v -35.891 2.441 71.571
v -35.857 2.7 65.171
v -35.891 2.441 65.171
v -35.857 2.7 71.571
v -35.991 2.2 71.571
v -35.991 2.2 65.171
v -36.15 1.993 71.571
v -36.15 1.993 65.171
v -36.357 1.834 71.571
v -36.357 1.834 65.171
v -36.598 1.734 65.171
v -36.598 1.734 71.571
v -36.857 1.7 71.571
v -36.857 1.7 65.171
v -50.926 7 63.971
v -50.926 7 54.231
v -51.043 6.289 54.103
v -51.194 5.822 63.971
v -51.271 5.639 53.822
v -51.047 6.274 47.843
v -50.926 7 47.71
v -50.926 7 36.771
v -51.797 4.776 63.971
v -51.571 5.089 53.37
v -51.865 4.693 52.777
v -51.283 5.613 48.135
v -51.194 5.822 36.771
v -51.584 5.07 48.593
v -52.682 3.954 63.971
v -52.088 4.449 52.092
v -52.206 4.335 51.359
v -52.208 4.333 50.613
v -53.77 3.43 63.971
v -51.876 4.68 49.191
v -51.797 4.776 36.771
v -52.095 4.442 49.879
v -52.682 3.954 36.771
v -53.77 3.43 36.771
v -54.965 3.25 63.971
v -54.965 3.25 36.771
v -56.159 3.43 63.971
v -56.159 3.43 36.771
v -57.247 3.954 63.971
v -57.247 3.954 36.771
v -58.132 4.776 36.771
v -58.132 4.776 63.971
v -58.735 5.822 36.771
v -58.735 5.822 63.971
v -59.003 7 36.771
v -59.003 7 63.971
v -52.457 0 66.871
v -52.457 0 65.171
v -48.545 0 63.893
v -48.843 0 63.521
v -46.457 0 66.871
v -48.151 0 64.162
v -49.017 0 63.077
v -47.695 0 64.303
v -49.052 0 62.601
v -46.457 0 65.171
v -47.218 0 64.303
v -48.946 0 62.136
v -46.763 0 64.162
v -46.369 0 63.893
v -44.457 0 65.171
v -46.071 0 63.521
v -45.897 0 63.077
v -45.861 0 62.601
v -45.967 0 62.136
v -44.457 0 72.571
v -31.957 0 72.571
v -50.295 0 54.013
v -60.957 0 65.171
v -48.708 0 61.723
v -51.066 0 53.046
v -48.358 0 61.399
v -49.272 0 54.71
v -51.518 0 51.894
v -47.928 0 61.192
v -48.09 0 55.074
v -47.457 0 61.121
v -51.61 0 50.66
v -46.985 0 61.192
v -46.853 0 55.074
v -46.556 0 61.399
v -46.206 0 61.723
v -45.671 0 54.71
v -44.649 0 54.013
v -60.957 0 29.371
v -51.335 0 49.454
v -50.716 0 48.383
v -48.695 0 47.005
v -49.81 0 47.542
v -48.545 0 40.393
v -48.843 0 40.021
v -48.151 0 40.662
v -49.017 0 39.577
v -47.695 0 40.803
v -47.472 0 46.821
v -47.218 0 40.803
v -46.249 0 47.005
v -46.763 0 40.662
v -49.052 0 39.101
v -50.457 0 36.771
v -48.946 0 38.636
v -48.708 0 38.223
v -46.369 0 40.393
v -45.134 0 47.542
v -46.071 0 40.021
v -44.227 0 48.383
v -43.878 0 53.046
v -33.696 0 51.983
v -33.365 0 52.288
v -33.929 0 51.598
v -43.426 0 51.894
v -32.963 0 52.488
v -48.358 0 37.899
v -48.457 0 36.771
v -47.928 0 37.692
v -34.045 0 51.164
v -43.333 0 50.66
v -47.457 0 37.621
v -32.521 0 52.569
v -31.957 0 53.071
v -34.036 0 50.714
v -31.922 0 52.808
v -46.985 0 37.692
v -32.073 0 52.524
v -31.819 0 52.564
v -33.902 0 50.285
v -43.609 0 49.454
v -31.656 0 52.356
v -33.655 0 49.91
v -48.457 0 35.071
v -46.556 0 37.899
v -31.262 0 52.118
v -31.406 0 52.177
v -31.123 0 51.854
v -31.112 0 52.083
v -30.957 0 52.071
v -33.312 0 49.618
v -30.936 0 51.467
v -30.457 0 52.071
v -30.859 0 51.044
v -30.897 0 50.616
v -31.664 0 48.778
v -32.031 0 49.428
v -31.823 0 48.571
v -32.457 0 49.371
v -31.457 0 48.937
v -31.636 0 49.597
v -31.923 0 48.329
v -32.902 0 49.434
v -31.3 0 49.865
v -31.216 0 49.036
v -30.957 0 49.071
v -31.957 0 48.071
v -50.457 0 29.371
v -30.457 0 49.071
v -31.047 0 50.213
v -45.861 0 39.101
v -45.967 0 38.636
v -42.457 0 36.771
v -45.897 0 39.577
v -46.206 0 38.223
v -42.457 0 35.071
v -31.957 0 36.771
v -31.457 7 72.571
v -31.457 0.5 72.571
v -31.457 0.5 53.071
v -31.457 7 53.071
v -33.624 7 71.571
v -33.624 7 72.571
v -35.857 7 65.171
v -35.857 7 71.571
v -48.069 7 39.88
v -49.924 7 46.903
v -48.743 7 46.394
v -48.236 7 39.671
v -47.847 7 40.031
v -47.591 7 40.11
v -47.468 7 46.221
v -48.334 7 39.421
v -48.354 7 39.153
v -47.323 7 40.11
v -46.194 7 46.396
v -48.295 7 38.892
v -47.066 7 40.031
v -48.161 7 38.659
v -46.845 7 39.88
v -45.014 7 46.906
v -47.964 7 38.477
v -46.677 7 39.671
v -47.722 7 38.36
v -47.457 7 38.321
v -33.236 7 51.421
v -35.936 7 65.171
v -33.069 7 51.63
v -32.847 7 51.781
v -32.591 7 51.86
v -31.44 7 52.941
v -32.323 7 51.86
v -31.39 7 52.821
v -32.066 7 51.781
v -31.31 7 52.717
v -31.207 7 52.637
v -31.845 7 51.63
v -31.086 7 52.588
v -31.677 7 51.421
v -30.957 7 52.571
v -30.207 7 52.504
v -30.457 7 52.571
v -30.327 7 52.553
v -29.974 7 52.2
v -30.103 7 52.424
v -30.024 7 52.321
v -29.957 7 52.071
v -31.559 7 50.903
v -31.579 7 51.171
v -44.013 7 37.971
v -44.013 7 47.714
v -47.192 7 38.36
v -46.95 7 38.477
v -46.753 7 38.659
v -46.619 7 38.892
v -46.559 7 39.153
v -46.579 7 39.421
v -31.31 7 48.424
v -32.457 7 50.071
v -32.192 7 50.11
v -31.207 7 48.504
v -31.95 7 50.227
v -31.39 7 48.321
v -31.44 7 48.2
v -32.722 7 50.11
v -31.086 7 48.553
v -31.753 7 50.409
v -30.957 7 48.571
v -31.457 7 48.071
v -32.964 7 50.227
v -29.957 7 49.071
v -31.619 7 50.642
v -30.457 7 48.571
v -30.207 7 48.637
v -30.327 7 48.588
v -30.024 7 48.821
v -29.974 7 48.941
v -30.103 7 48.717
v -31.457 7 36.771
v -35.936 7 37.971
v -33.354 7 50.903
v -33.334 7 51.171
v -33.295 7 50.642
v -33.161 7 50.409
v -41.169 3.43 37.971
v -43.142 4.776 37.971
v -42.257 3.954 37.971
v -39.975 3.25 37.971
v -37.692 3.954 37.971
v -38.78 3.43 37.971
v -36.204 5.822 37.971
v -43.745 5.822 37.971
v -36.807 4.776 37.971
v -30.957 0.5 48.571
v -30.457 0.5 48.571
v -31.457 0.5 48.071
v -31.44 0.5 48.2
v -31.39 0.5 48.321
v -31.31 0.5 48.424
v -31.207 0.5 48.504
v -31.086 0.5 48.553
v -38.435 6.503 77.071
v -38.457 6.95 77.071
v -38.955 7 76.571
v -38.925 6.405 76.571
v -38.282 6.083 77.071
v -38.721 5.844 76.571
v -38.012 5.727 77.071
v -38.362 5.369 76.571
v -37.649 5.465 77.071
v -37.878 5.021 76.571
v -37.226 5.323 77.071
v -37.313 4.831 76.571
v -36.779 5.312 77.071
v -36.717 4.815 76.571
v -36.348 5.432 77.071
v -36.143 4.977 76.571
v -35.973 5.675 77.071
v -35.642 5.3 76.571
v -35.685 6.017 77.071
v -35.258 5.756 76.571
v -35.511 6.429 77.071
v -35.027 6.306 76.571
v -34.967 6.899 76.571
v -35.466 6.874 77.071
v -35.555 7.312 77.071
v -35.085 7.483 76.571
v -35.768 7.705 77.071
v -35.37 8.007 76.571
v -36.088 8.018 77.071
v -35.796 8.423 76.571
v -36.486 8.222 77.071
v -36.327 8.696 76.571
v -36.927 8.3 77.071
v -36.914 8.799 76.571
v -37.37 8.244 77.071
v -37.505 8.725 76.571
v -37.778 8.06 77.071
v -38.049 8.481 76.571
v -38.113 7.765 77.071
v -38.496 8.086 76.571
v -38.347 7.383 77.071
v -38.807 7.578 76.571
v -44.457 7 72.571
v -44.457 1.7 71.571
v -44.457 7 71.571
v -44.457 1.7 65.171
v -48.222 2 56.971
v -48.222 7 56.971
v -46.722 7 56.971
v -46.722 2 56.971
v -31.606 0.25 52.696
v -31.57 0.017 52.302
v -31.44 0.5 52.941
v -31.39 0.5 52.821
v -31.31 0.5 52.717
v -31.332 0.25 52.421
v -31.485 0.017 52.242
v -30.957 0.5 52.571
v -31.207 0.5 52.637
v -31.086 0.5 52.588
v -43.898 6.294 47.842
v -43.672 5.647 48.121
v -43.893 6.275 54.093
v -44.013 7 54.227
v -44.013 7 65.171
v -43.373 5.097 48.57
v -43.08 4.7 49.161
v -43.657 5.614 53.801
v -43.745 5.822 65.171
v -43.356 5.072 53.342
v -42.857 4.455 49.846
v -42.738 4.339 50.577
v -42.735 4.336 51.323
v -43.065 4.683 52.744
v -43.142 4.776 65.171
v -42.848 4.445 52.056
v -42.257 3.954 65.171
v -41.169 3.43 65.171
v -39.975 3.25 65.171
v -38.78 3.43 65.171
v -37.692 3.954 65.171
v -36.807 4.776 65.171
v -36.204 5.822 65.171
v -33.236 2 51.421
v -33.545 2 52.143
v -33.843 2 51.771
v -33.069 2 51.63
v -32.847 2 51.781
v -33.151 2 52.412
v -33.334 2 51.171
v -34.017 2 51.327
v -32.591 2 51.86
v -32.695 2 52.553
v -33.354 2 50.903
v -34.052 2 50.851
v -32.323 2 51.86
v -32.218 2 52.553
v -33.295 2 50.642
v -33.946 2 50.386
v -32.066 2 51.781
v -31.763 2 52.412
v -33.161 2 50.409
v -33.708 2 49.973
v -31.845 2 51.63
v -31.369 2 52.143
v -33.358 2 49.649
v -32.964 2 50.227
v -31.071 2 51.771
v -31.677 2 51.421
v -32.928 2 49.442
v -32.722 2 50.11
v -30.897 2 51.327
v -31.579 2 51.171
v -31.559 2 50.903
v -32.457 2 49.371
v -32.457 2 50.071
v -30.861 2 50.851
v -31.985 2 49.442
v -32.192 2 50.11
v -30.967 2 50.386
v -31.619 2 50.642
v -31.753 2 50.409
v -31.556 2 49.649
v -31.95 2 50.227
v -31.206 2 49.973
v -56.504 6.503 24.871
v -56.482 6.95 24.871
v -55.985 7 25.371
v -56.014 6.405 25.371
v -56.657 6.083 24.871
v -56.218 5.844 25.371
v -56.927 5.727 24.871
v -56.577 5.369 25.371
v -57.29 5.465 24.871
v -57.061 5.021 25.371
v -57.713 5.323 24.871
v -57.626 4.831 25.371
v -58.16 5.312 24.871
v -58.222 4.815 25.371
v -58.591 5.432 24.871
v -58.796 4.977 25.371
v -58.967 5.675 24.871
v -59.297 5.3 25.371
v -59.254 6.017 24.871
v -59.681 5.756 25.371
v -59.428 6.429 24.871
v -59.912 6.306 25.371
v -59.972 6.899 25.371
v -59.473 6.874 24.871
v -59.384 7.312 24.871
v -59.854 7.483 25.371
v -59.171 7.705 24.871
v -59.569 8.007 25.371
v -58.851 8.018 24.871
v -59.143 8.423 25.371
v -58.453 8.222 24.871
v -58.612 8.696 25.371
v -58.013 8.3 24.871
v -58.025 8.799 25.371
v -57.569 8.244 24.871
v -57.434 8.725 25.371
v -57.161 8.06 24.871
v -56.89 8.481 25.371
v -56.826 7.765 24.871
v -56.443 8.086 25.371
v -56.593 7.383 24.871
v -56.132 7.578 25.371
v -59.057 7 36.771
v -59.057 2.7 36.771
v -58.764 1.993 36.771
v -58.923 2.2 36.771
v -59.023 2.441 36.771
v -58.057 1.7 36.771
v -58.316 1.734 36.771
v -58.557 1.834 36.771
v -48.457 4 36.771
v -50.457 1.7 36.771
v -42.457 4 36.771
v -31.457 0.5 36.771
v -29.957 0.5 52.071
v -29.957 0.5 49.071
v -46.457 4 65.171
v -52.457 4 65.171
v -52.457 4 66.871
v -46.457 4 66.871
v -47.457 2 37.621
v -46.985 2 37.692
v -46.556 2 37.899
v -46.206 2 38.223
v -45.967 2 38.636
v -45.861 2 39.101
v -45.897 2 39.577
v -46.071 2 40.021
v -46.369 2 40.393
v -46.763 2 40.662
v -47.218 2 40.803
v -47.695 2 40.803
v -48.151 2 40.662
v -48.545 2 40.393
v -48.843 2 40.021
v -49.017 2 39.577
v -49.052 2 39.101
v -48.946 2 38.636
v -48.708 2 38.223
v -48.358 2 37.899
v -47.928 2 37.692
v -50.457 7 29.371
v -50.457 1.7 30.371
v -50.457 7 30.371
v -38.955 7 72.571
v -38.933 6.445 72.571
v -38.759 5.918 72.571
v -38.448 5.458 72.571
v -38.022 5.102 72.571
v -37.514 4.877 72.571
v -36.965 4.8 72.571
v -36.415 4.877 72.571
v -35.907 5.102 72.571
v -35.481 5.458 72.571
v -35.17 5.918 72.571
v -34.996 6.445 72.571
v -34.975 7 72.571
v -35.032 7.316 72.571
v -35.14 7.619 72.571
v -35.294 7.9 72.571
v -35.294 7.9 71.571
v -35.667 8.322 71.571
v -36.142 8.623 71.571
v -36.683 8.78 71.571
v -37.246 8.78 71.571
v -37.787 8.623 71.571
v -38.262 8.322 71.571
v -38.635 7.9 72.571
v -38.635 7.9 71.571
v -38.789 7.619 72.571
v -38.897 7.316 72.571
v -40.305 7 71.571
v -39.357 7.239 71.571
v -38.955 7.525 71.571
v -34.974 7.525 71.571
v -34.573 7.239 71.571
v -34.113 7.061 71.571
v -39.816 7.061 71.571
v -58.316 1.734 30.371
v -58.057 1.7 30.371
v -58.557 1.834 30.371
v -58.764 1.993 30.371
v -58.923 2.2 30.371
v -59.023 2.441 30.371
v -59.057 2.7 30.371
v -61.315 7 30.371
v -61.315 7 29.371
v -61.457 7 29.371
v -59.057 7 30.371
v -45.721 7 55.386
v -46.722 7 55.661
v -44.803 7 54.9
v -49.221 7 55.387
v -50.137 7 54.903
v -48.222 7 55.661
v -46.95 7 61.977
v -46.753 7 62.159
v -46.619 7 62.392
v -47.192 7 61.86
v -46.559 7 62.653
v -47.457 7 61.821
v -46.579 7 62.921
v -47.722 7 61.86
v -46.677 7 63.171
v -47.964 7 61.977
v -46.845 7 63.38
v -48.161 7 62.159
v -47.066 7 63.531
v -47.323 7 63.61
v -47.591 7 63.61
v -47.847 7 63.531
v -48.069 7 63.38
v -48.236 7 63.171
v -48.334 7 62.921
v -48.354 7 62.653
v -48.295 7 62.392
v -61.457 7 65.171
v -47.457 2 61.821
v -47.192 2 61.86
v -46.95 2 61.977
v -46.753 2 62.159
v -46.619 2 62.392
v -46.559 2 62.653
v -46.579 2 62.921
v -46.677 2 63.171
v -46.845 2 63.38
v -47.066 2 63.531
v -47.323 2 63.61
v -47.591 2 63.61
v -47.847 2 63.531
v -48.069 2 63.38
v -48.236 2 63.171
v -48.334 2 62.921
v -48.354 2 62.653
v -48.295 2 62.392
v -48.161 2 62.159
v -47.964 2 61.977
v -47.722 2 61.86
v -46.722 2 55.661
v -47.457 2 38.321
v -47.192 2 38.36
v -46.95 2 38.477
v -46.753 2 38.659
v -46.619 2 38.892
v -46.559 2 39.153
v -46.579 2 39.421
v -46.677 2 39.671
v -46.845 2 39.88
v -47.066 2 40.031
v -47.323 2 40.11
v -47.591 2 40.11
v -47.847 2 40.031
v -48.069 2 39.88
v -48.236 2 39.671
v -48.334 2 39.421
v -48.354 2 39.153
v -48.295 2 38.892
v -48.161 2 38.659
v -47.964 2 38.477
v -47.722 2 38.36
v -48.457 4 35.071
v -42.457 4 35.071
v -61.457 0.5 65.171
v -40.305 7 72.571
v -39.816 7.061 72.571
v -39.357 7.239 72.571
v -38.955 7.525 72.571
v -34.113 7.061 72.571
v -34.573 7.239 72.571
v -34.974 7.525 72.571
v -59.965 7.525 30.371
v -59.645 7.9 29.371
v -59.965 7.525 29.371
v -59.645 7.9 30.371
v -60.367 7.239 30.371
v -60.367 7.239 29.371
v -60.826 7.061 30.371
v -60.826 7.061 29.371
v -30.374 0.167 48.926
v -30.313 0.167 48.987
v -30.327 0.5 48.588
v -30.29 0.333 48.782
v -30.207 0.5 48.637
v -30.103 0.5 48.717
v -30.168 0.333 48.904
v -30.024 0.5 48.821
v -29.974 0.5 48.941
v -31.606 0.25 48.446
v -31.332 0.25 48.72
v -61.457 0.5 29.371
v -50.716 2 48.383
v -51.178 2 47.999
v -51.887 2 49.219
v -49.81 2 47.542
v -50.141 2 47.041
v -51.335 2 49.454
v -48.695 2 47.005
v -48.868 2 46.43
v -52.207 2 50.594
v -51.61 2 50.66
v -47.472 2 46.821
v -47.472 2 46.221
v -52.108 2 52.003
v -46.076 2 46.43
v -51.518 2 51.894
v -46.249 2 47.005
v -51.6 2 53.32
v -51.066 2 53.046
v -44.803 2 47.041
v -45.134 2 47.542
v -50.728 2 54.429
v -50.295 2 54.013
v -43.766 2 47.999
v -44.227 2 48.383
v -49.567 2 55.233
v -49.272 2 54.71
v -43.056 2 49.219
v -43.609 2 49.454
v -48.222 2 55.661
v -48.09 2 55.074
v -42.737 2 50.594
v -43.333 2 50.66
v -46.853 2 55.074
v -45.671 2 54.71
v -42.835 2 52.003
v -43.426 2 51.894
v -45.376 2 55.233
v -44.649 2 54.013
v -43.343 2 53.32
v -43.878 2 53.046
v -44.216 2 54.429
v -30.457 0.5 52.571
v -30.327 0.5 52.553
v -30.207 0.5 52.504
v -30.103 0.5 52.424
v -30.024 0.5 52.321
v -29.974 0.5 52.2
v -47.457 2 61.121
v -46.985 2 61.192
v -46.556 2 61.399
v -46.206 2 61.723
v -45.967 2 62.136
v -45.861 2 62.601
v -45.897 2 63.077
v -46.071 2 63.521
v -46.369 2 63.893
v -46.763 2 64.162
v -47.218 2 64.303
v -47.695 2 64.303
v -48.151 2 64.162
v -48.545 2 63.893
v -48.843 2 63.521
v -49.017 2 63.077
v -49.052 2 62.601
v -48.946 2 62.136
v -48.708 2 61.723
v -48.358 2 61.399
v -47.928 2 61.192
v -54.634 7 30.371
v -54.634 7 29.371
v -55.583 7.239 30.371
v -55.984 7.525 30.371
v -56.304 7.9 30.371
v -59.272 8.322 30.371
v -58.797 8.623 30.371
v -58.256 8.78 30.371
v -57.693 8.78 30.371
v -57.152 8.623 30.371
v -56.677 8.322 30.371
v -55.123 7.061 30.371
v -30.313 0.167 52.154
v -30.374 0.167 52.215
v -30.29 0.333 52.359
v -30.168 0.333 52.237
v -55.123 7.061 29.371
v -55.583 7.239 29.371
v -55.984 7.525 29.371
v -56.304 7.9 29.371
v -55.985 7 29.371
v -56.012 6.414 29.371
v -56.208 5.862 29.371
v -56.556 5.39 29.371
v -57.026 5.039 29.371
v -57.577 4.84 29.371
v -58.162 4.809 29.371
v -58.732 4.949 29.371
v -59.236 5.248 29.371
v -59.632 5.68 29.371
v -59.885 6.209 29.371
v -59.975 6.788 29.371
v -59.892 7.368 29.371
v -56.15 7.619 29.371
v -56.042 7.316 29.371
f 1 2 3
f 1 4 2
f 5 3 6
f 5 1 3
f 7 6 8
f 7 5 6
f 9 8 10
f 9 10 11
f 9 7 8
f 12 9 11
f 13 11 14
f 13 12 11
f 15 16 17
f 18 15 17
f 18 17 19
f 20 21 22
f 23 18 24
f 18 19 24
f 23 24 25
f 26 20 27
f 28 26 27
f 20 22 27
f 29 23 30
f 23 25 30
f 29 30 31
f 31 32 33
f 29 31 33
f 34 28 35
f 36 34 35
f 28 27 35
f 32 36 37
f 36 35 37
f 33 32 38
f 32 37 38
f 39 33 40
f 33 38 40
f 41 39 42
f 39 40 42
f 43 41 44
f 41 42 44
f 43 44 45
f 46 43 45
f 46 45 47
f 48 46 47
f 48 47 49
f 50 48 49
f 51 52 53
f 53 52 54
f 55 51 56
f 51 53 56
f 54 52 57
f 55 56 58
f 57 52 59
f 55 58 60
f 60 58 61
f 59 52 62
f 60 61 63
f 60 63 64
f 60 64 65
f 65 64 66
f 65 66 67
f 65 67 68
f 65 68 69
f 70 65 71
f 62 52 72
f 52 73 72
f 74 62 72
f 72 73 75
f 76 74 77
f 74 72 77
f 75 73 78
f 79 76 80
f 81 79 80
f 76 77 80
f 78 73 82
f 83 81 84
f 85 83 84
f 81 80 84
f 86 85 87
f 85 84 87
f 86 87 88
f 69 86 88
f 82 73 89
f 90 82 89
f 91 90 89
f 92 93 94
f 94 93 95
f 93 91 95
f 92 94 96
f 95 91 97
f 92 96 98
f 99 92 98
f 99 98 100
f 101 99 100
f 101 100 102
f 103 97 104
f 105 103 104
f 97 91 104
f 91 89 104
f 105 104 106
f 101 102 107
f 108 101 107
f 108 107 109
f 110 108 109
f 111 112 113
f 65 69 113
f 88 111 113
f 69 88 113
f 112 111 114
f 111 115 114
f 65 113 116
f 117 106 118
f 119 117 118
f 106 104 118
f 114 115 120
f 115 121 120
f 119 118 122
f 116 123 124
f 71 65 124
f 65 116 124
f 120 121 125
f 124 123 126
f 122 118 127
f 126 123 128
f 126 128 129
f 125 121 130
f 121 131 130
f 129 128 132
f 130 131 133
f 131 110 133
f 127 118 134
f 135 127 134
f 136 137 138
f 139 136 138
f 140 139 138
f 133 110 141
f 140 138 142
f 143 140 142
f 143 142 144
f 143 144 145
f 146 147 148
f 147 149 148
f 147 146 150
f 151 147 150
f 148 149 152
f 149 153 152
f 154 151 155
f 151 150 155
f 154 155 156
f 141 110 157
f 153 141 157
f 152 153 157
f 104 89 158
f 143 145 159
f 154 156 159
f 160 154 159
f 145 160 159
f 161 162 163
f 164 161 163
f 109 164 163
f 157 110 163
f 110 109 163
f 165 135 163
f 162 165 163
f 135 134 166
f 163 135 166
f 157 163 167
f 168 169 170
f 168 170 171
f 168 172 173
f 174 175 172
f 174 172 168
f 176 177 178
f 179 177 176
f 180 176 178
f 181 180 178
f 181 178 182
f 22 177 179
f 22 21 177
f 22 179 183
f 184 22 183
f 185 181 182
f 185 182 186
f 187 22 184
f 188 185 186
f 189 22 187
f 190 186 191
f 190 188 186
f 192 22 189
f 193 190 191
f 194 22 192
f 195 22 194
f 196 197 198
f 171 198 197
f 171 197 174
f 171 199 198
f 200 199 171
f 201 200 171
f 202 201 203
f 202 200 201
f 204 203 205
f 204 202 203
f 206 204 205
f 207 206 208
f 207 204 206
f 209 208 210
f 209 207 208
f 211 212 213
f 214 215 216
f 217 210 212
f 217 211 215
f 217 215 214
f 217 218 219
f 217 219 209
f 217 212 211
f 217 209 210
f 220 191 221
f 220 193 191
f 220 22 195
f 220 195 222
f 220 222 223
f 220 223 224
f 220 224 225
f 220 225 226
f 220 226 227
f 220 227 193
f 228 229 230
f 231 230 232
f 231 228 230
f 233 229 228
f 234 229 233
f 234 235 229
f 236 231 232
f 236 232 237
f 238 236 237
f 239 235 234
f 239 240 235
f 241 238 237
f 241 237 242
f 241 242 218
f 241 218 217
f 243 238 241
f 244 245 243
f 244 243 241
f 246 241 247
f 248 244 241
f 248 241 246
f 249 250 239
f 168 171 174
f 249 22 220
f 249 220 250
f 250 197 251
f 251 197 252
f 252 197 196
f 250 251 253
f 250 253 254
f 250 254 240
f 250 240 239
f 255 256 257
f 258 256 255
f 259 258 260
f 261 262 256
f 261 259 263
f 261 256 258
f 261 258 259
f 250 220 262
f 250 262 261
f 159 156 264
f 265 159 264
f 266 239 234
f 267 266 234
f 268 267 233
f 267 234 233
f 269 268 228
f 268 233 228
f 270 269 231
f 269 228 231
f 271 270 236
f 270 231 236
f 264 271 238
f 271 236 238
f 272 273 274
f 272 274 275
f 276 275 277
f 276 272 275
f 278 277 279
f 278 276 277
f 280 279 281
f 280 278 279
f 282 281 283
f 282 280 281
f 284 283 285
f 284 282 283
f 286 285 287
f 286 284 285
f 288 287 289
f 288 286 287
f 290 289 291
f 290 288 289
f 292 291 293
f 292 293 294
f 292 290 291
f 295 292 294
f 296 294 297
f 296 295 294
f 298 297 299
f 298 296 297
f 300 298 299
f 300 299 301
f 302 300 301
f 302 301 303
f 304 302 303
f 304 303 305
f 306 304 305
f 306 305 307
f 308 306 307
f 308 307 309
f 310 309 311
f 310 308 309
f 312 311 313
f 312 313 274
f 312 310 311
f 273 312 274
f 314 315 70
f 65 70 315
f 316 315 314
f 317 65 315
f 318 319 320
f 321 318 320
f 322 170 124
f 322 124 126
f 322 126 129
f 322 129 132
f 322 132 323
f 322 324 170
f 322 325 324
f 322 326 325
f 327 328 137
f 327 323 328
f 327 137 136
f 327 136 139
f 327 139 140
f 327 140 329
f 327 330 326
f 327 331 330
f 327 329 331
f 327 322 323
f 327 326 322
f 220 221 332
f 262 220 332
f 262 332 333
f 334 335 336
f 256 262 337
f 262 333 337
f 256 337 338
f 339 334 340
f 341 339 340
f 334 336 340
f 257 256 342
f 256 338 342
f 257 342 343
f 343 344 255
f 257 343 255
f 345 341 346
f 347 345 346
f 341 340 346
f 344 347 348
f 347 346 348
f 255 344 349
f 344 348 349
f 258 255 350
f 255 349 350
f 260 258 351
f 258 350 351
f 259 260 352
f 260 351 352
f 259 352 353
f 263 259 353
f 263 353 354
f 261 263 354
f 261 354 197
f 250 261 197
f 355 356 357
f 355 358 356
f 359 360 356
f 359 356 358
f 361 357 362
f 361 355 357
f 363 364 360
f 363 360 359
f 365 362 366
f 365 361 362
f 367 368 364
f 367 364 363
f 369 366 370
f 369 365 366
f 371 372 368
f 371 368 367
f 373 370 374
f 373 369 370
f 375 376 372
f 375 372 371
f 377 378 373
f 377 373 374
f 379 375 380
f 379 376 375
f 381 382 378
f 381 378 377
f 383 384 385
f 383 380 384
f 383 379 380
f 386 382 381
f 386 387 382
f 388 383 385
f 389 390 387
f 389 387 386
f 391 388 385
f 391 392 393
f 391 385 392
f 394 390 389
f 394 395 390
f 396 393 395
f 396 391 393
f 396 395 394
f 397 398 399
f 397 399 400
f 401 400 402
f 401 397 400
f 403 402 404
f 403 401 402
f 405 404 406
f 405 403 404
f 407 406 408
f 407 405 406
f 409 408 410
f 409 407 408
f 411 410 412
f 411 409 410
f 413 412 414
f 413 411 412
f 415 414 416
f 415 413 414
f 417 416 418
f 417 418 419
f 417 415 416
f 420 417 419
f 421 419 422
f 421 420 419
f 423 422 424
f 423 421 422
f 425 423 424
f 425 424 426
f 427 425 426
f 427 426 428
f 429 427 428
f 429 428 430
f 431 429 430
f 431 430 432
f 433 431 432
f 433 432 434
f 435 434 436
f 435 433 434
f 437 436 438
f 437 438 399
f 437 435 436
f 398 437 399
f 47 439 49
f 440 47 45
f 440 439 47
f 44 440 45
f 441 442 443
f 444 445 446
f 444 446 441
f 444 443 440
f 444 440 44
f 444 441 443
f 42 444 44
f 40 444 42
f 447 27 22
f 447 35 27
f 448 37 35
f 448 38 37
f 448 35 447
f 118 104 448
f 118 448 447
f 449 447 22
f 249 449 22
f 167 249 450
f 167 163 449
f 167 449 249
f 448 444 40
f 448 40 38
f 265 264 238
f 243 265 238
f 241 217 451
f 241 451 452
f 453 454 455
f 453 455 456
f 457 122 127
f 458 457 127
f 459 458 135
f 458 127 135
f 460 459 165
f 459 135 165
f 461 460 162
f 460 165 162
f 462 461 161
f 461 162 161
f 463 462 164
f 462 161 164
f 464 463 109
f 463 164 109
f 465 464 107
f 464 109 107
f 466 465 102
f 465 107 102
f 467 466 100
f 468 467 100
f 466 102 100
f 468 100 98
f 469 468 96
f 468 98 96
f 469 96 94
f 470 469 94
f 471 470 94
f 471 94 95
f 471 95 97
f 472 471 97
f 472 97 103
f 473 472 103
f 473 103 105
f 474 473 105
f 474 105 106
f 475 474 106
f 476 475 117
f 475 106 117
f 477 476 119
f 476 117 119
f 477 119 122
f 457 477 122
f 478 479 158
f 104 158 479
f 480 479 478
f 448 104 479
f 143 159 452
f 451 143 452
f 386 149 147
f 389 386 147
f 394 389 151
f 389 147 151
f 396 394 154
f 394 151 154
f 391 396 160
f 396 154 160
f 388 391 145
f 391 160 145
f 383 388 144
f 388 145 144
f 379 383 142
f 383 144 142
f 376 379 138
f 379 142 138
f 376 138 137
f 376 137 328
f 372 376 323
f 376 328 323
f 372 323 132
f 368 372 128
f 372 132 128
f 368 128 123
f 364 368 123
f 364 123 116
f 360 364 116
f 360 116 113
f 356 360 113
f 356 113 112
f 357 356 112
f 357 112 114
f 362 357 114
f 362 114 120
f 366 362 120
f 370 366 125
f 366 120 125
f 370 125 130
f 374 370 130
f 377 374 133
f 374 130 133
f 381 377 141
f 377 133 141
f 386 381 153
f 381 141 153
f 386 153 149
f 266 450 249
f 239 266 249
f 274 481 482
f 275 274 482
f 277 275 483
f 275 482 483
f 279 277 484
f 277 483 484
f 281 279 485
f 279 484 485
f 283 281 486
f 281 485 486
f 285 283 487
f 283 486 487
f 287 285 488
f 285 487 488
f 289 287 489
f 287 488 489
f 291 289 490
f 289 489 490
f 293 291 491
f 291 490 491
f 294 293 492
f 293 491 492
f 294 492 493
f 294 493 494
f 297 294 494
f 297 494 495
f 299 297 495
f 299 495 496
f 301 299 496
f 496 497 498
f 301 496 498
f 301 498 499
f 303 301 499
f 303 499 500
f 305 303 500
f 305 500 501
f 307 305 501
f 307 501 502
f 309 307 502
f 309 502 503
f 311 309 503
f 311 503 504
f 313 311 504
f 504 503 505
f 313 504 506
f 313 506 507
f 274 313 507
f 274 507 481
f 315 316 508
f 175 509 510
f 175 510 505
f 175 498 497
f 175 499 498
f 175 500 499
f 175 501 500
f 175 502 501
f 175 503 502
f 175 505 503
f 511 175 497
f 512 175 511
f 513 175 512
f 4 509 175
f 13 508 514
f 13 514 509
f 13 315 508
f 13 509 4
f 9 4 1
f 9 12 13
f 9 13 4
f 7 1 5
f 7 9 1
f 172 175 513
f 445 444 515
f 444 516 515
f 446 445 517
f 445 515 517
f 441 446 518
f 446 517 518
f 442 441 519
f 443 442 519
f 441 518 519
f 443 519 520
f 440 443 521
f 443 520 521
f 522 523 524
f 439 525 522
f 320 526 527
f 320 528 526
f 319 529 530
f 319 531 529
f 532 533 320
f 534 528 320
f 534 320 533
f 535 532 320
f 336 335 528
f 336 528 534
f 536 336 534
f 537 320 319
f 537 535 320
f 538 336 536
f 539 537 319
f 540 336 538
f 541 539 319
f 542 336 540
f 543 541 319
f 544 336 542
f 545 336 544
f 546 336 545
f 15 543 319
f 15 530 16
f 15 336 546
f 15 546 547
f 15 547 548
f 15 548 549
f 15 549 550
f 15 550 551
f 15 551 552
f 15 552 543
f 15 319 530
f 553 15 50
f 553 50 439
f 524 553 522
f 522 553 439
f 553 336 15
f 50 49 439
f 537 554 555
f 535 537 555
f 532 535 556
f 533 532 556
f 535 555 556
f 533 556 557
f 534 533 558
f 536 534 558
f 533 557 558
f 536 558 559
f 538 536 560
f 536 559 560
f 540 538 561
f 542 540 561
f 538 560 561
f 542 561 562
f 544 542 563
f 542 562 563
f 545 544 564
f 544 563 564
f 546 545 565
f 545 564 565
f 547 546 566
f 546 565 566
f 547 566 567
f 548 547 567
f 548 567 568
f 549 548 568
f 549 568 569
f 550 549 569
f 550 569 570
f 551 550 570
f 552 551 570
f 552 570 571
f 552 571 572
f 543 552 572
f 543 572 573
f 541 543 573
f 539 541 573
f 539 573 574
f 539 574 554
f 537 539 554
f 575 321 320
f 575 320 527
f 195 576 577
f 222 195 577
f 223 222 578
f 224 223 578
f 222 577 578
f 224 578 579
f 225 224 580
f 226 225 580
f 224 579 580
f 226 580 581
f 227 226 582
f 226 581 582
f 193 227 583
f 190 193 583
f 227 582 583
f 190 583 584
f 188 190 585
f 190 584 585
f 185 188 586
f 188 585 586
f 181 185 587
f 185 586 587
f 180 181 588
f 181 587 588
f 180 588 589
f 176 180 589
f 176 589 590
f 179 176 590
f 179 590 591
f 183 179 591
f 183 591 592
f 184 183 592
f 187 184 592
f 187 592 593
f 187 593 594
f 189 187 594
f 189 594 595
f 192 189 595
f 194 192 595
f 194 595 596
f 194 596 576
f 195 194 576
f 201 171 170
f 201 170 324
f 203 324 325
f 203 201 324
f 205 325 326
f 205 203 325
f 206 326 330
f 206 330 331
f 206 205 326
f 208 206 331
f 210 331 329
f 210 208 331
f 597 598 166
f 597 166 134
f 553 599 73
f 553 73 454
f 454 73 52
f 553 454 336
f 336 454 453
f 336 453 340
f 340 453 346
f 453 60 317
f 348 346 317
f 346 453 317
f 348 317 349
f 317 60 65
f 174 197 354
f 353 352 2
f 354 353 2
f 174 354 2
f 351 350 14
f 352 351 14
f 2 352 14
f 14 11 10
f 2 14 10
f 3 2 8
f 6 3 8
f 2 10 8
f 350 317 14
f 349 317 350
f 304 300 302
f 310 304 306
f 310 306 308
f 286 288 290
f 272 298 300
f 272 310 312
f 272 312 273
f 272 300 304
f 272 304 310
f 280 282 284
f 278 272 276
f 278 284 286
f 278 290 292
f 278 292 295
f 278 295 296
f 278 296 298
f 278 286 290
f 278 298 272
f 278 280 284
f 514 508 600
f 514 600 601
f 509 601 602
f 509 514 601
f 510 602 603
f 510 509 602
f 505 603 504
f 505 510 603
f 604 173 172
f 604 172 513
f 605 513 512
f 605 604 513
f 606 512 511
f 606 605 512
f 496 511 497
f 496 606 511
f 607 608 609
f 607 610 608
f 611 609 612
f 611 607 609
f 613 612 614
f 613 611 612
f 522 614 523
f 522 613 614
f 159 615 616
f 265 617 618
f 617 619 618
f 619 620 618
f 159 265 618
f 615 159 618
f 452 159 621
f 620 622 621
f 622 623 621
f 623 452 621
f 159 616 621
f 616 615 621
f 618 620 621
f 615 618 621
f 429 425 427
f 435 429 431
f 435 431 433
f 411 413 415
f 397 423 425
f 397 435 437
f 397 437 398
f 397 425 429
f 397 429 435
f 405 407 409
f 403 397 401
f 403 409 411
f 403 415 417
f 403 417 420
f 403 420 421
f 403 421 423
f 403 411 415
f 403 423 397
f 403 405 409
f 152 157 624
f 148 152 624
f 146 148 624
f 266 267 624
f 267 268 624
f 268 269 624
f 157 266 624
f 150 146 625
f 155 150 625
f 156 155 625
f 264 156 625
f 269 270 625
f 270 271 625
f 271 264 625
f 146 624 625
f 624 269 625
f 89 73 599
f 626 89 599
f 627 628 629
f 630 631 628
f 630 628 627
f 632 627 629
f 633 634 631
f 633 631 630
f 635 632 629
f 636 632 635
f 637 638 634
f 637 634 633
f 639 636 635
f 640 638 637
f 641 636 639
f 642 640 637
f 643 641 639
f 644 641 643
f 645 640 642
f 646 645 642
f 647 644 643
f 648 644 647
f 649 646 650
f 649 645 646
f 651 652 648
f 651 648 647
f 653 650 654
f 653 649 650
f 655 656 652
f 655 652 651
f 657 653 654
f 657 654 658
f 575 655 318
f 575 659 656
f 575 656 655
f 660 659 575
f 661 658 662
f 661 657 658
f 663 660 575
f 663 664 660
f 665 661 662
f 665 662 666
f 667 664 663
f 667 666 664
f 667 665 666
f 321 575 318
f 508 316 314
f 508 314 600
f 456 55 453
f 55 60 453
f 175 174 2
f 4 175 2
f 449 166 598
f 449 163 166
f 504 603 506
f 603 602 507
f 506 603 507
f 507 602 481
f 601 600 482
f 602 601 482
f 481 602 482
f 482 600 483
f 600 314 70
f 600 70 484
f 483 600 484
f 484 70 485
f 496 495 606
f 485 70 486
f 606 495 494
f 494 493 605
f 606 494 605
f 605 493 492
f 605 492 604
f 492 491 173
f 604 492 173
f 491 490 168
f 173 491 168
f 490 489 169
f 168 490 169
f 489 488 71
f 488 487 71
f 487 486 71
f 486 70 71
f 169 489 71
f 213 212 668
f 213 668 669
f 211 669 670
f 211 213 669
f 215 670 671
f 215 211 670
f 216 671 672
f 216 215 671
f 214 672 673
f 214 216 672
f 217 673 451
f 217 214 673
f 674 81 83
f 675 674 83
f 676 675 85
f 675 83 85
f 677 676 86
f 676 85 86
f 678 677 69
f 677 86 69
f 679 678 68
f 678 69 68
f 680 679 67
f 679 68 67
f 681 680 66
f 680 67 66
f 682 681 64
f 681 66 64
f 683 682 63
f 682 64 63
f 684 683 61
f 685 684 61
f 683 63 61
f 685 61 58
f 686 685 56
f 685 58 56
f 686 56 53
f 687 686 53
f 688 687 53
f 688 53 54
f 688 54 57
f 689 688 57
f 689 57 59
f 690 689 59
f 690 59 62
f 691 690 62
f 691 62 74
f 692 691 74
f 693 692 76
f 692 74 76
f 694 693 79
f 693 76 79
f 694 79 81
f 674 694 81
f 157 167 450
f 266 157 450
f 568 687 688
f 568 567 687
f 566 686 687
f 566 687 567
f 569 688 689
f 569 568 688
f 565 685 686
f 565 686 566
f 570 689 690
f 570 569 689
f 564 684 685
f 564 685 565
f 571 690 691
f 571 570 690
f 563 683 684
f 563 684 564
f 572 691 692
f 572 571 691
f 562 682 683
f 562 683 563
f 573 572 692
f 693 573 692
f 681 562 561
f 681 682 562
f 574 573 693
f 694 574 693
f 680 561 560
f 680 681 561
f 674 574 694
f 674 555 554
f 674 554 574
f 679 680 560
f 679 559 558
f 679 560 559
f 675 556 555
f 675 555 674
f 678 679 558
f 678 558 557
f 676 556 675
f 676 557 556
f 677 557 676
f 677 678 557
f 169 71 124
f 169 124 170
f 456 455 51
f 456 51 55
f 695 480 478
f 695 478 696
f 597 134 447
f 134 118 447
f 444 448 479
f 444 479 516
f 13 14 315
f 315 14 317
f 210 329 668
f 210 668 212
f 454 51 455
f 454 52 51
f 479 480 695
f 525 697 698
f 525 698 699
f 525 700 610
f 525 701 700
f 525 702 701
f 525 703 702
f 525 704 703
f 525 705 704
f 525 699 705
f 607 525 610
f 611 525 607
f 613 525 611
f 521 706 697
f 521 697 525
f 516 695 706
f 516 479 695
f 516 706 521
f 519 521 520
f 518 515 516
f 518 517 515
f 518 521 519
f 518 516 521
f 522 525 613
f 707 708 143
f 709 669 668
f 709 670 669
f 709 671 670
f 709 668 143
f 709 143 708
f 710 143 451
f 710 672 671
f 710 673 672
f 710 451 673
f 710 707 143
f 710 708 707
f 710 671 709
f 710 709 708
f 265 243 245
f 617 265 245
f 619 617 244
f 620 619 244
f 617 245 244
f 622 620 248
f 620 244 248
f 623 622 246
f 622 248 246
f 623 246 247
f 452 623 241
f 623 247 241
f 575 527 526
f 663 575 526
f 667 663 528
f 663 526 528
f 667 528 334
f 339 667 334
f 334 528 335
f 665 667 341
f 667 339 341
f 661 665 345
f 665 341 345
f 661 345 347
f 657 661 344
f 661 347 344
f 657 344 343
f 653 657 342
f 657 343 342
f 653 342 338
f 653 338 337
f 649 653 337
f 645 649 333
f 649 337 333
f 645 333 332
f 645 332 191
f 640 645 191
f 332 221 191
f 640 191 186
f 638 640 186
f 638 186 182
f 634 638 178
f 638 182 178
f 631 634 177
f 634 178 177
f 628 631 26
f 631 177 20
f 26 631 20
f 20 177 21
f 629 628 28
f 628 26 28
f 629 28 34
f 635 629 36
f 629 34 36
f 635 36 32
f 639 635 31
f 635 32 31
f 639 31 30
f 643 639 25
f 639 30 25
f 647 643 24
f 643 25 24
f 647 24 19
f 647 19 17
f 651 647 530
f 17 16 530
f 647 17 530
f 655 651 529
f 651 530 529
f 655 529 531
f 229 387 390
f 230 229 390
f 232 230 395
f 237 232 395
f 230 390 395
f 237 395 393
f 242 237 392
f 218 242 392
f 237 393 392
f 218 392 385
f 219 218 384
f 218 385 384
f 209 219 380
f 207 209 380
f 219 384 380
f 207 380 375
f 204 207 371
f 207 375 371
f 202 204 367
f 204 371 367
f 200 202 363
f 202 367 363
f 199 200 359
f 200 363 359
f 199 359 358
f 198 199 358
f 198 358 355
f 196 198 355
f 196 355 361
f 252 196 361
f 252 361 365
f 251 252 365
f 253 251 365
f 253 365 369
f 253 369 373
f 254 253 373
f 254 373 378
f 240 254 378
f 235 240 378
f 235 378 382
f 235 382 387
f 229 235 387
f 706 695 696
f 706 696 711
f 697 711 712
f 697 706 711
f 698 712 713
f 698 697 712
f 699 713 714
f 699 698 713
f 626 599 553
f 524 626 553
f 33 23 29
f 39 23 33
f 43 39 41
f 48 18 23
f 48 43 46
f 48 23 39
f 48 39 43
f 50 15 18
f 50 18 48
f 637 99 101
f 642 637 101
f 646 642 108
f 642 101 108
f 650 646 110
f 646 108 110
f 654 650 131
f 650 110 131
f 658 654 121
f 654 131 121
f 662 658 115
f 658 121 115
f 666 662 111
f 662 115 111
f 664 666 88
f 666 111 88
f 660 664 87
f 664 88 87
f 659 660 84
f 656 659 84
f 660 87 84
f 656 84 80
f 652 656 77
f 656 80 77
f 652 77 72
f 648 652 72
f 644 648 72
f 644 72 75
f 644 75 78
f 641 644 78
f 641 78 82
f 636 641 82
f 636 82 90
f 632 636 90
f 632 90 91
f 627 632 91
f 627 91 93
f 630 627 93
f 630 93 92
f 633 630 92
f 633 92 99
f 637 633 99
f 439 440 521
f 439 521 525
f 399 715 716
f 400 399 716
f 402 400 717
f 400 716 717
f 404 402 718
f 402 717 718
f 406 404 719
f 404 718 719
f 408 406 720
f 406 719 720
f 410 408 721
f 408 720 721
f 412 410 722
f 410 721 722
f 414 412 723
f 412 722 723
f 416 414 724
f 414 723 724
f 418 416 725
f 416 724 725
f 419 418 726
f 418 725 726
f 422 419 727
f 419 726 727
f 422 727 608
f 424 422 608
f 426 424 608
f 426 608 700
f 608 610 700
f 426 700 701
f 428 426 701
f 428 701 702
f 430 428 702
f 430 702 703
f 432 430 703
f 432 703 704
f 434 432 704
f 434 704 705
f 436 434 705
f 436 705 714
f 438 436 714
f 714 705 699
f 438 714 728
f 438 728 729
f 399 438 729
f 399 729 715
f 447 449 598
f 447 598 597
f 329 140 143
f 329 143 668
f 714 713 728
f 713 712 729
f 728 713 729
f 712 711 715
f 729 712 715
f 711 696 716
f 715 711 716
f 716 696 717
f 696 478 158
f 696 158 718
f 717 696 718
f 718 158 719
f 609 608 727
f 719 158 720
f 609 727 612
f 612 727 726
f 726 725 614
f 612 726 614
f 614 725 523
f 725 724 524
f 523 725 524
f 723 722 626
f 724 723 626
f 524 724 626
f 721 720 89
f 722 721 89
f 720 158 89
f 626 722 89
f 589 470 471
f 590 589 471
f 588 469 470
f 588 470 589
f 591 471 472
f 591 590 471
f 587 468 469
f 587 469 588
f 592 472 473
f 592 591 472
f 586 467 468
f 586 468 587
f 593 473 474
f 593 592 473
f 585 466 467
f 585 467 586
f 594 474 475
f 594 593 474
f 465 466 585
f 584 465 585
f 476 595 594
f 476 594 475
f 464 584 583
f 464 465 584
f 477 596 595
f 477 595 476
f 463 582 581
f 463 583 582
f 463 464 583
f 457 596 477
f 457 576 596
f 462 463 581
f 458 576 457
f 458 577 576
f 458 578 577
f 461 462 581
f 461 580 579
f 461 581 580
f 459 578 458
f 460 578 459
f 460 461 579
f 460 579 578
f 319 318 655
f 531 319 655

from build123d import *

# Parameters (mm, degrees)
SKETCH1_W            = 30
SKETCH1_H            = 30.8
BOSS_EXTRUDE1_DEPTH  = 7
SKETCH2_R            = 4.15
CUT_EXTRUDE1_DEPTH   = 6.5
SKETCH3_W            = 15
SKETCH3_H            = 1.2
SKETCH3_W_2          = 9
SKETCH3_W_3          = 11
SKETCH3_W_4          = 13
CUT_EXTRUDE2_DEPTH   = 4
SKETCH4_W            = 30
SKETCH4_H            = 3
CUT_EXTRUDE3_DEPTH   = 1.2
SKETCH5_W            = 30
SKETCH5_H            = 3
CUT_EXTRUDE4_DEPTH   = 1.2
SKETCH6_R            = 4.05
CUT_EXTRUDE5_DEPTH   = 27.2
SKETCH7_R            = 4.05
CUT_EXTRUDE6_DEPTH   = 27.2
SKETCH8_R            = 4.75
CUT_EXTRUDE7_DEPTH   = 5
BOSS_EXTRUDE2_DEPTH  = 6.4
FILLET1_R            = 1
BOSS_EXTRUDE3_DEPTH  = 6.4
FILLET2_R            = 1
SKETCH12_W           = 1.5
SKETCH12_H           = 1.344099237
CUT_EXTRUDE8_DEPTH   = 5
SKETCH13_W           = 13
SKETCH13_H           = 7
BOSS_EXTRUDE4_DEPTH  = 1
SKETCH14_W           = 11
SKETCH14_H           = 7
BOSS_EXTRUDE5_DEPTH  = 1
SKETCH15_R           = 2
BOSS_EXTRUDE8_DEPTH  = 5.5
SKETCH16_R           = 2
BOSS_EXTRUDE9_DEPTH  = 5.5
FILLET3_R            = 2
FILLET4_R            = 2
FILLET5_R            = 2
CHAMFER2_SIZE        = 0.5
CHAMFER3_SIZE        = 0.5
SKETCH17_W           = 4
SKETCH17_H           = 7
BOSS_EXTRUDE10_DEPTH = 1.5
FILLET7_R            = 0.5
SKETCH18_R           = 0.9
CUT_EXTRUDE9_DEPTH   = 99.965895754
SKETCH19_R           = 1.6
CUT_EXTRUDE10_DEPTH  = 2
SKETCH20_R           = 0.9
CUT_EXTRUDE11_DEPTH  = 99.965895754
SKETCH21_R           = 1.6
CUT_EXTRUDE12_DEPTH  = 2
CHAMFER6_SIZE        = 0.5
SKETCH22_W           = 6
SKETCH22_H           = 4
BOSS_EXTRUDE11_DEPTH = 0.5
SKETCH23_W           = 6
SKETCH23_H           = 4
BOSS_EXTRUDE12_DEPTH = 0.5


with BuildPart() as part:
    # Sketch1 → Boss-Extrude1 (new body)
    with BuildSketch(Plane(origin=(0, 0, 0), x_dir=(1, 0, 0), z_dir=(0, 1, 0))):
        with Locations((-46.45686042, -50.970505576)):
            Rectangle(SKETCH1_W, SKETCH1_H)
    extrude(amount=BOSS_EXTRUDE1_DEPTH)

    # Sketch2 → Cut-Extrude1 (cut)
    with BuildSketch(Plane.XZ):
        with Locations(Location((-47.47186042, 50.970505576, 0), (0, 0, 270))):
            Circle(SKETCH2_R)
    extrude(amount=-CUT_EXTRUDE1_DEPTH, mode=Mode.SUBTRACT)

    # Sketch3 → Cut-Extrude2 (cut)
    with BuildSketch(Plane.XZ):
        with Locations((-38.95686042, 65.770505576)):
            Rectangle(SKETCH3_W, SKETCH3_H)
        with Locations((-56.95686042, 65.770505576)):
            Rectangle(SKETCH3_W_2, SKETCH3_H)
        with Locations((-36.95686042, 36.170505576)):
            Rectangle(SKETCH3_W_3, SKETCH3_H)
        with Locations((-54.95686042, 36.170505576)):
            Rectangle(SKETCH3_W_4, SKETCH3_H)
    extrude(amount=-CUT_EXTRUDE2_DEPTH, mode=Mode.SUBTRACT)

    # Sketch4 → Cut-Extrude3 (cut)
    with BuildSketch(Plane.XY.offset(66.370505576)):
        with Locations((-46.45686042, 5.5)):
            Rectangle(SKETCH4_W, SKETCH4_H)
    extrude(amount=-CUT_EXTRUDE3_DEPTH, mode=Mode.SUBTRACT)

    # Sketch5 → Cut-Extrude4 (cut)
    with BuildSketch(Plane(origin=(0, 0, 35.570505576), x_dir=(-1, 0, 0), z_dir=(0, 0, -1))):
        with Locations((46.45686042, 5.5)):
            Rectangle(SKETCH5_W, SKETCH5_H)
    extrude(amount=-CUT_EXTRUDE4_DEPTH, mode=Mode.SUBTRACT)

    # Sketch6 → Cut-Extrude5 (cut)
    with BuildSketch(Plane.XY.offset(65.170505576)):
        with Locations((-39.974556342, 7.3)):
            Circle(SKETCH6_R)
    extrude(amount=-CUT_EXTRUDE5_DEPTH, mode=Mode.SUBTRACT)

    # Sketch7 → Cut-Extrude6 (cut)
    with BuildSketch(Plane(origin=(0, 0, 36.770505576), x_dir=(-1, 0, 0), z_dir=(0, 0, -1))):
        with Locations((54.96455223, 7.3)):
            Circle(SKETCH7_R)
    extrude(amount=-CUT_EXTRUDE6_DEPTH, mode=Mode.SUBTRACT)

    # Sketch8 → Cut-Extrude7 (cut)
    with BuildSketch(Plane(origin=(0, 7, 0), x_dir=(1, 0, 0), z_dir=(0, 1, 0))):
        with Locations(Location((-47.47186042, -50.970505576, 0), (0, 0, 270))):
            Circle(SKETCH8_R)
    extrude(amount=-CUT_EXTRUDE7_DEPTH, mode=Mode.SUBTRACT)

    # Sketch10 → Boss-Extrude2 (add)
    with BuildSketch(Plane.XY.offset(65.170505576)):
        Polygon((-31.45686042, 0), (-31.45686042, 7), (-35.85686042, 7), (-35.85686042, 1.7), (-44.45686042, 1.7), (-44.45686042, 0), align=None)
    extrude(amount=BOSS_EXTRUDE2_DEPTH)

    # Fillet1
    fillet1_edges = [part.edges().sort_by_distance(p)[0] for p in [
        (-35.85686042, 1.7, 68.370505576),
    ]]
    fillet(fillet1_edges, radius=FILLET1_R)

    # Sketch11 → Boss-Extrude3 (add)
    with BuildSketch(Plane(origin=(0, 0, 36.770505576), x_dir=(-1, 0, 0), z_dir=(0, 0, -1))):
        Polygon((61.45686042, 7), (61.45686042, 0), (50.45686042, 0), (50.45686042, 1.7), (59.05686042, 1.7), (59.05686042, 7), align=None)
    extrude(amount=BOSS_EXTRUDE3_DEPTH)

    # Fillet2
    fillet2_edges = [part.edges().sort_by_distance(p)[0] for p in [
        (-59.05686042, 1.7, 33.570505576),
    ]]
    fillet(fillet2_edges, radius=FILLET2_R)

    # Sketch12 → Cut-Extrude8 (cut)
    with BuildSketch(Plane(origin=(0, 7, 0), x_dir=(1, 0, 0), z_dir=(0, 1, 0))):
        with Locations((-47.47186042, -56.298455958)):
            Rectangle(SKETCH12_W, SKETCH12_H)
    extrude(amount=-CUT_EXTRUDE8_DEPTH, mode=Mode.SUBTRACT)

    # Sketch13 → Boss-Extrude4 (add)
    with BuildSketch(Plane.XY.offset(71.570505576)):
        with Locations((-37.95686042, 3.5)):
            Rectangle(SKETCH13_W, SKETCH13_H)
    extrude(amount=BOSS_EXTRUDE4_DEPTH)

    # Sketch14 → Boss-Extrude5 (add)
    with BuildSketch(Plane(origin=(0, 0, 30.370505576), x_dir=(-1, 0, 0), z_dir=(0, 0, -1))):
        with Locations((55.95686042, 3.5)):
            Rectangle(SKETCH14_W, SKETCH14_H)
    extrude(amount=BOSS_EXTRUDE5_DEPTH)

    # Sketch15 → Boss-Extrude8 (add)
    with BuildSketch(Plane.XY.offset(71.570505576)):
        with Locations(Location((-36.96455223, 6.8, 0), (0, 0, 174.260829523))):
            Circle(SKETCH15_R)
    extrude(amount=BOSS_EXTRUDE8_DEPTH)

    # Sketch16 → Boss-Extrude9 (add)
    with BuildSketch(Plane(origin=(0, 0, 30.370505576), x_dir=(-1, 0, 0), z_dir=(0, 0, -1))):
        with Locations(Location((57.974556342, 6.8, 0), (0, 0, 174.260829523))):
            Circle(SKETCH16_R)
    extrude(amount=BOSS_EXTRUDE9_DEPTH)

    # Fillet3
    fillet3_edges = [part.edges().sort_by_distance(p)[0] for p in [
        (-59.964531217, 7, 29.870505576),
    ]]
    fillet(fillet3_edges, radius=FILLET3_R)

    # Fillet4
    # the kernel refuses this fillet: 2 mm, written as the material it adds along each edge
    with BuildSketch(Plane(origin=(-55.984581468, 7, 30.370505576), x_dir=(1.0, 6.770411692114482e-12, 0), z_dir=(0, 0, -1))) as fillet4_piece_1:
        with BuildLine():
            CenterArc((1.350683743, -2), FILLET4_R, 90, 56.632987031)
            ThreePointArc((-0.319645565, -0.9), (-0.105311329, -0.469360383), (0, 0))
            Line((0, 0), (1.350683743, 0))
        make_face()
    extrude(amount=1)

    # Fillet5
    # the kernel refuses this fillet: 2 mm, written as the material it adds along each edge
    with BuildSketch(Plane(origin=(-38.954527104, 7, 71.570505576), x_dir=(-1.0, 6.9854393361833605e-12, 0), z_dir=(0, 0, 1)), Plane(origin=(-34.974577356, 7, 72.570505576), x_dir=(1, 0, 0), z_dir=(0, 0, -1))) as fillet5_piece_1:
        with BuildLine():
            CenterArc((1.350683743, -2), FILLET5_R, 90, 56.632987031)
            ThreePointArc((-0.319645565, -0.9), (-0.105311329, -0.469360383), (0, 0))
            Line((0, 0), (1.350683743, 0))
        make_face()
    extrude(amount=1)

    # Chamfer2
    chamfer2_edges = [part.edges().sort_by_distance(p)[0] for p in [
        (-34.974577356, 6.6, 77.070505576),
    ]]
    chamfer(chamfer2_edges, length=CHAMFER2_SIZE)

    # Chamfer3
    chamfer3_edges = [part.edges().sort_by_distance(p)[0] for p in [
        (-59.964531217, 6.6, 24.870505576),
    ]]
    chamfer(chamfer3_edges, length=CHAMFER3_SIZE)

    # Sketch17 → Boss-Extrude10 (add)
    with BuildSketch(Plane(origin=(-31.45686042, 0, 0), x_dir=(0, 0, -1), z_dir=(1, 0, 0))):
        with Locations((-50.570505576, 3.5)):
            Rectangle(SKETCH17_W, SKETCH17_H)
    extrude(amount=BOSS_EXTRUDE10_DEPTH)

    # Fillet7
    fillet7_edges = [part.edges().sort_by_distance(p)[0] for p in [
        (-31.45686042, 3.5, 52.570505576),
        (-31.45686042, 3.5, 48.570505576),
        (-29.95686042, 3.5, 52.570505576),
        (-29.95686042, 3.5, 48.570505576),
    ]]
    fillet(fillet7_edges, radius=FILLET7_R)

    # Sketch18 → Cut-Extrude9 (cut, through all)
    with BuildSketch(Plane.XZ):
        with Locations(Location((-32.45686042, 50.970505576, 0), (0, 0, 270))):
            Circle(SKETCH18_R)
    extrude(amount=-CUT_EXTRUDE9_DEPTH, mode=Mode.SUBTRACT)

    # Sketch19 → Cut-Extrude10 (cut)
    with BuildSketch(Plane.XZ):
        with Locations(Location((-32.45686042, 50.970505576, 0), (0, 0, 270))):
            Circle(SKETCH19_R)
    extrude(amount=-CUT_EXTRUDE10_DEPTH, mode=Mode.SUBTRACT)

    # Sketch20 → Cut-Extrude11 (cut, through all)
    with BuildSketch(Plane.XZ):
        with Locations(Location((-47.45686042, 62.720505576, 0), (0, 0, 270))):
            Circle(SKETCH20_R)
        with Locations(Location((-47.45686042, 39.220505576, 0), (0, 0, 270))):
            Circle(SKETCH20_R)
    extrude(amount=-CUT_EXTRUDE11_DEPTH, mode=Mode.SUBTRACT)

    # Sketch21 → Cut-Extrude12 (cut)
    with BuildSketch(Plane.XZ):
        with Locations(Location((-47.45686042, 62.720505576, 0), (0, 0, 270))):
            Circle(SKETCH21_R)
        with Locations(Location((-47.45686042, 39.220505576, 0), (0, 0, 270))):
            Circle(SKETCH21_R)
    extrude(amount=-CUT_EXTRUDE12_DEPTH, mode=Mode.SUBTRACT)

    # Chamfer6
    # the kernel refuses this chamfer: 0.5 mm, written as the material it takes off along each edge
    with BuildSketch(Plane(origin=(-61.45686042, 0, 28.084664082), x_dir=(1, 0, 0), z_dir=(0, 0, 1))) as chamfer6_piece_1:
        Polygon((CHAMFER6_SIZE, 0), (0, CHAMFER6_SIZE), (0, 0), align=None)
    extrude(amount=38.371682988, mode=Mode.SUBTRACT)
    with BuildSketch(Plane(origin=(-31.45686042, 0, 53.070505576), x_dir=(-1, 0, 0), z_dir=(0, 0, 1))) as chamfer6_piece_2:
        Polygon((CHAMFER6_SIZE, 0), (0, -CHAMFER6_SIZE), (0, 0), align=None)
    extrude(amount=20.785841494, mode=Mode.SUBTRACT)
    with BuildSketch(Plane(origin=(-30.95686042, 0, 52.570505576), x_dir=(0, 0, -1), z_dir=(1, 0, 0))) as chamfer6_piece_3:
        Polygon((CHAMFER6_SIZE, 0), (0, CHAMFER6_SIZE), (0, 0), align=None)
    extrude(amount=0.5, mode=Mode.SUBTRACT)
    with BuildSketch(Plane(origin=(-29.95686042, 0, 49.070505576), x_dir=(-1, 0, 0), z_dir=(0, 0, 1))) as chamfer6_piece_4:
        Polygon((CHAMFER6_SIZE, 0), (0, -CHAMFER6_SIZE), (0, 0), align=None)
    extrude(amount=3, mode=Mode.SUBTRACT)
    with BuildSketch(Plane(origin=(-31.45686042, 0, 35.484664082), x_dir=(-1, 0, 0), z_dir=(0, 0, 1))) as chamfer6_piece_5:
        Polygon((CHAMFER6_SIZE, 0), (0, -CHAMFER6_SIZE), (0, 0), align=None)
    extrude(amount=12.585841494, mode=Mode.SUBTRACT)
    with BuildSketch(Plane(origin=(-30.95686042, 0, 48.570505576), x_dir=(0, 0, 1), z_dir=(1, 0, 0))) as chamfer6_piece_6:
        Polygon((CHAMFER6_SIZE, 0), (0, -CHAMFER6_SIZE), (0, 0), align=None)
    extrude(amount=0.5, mode=Mode.SUBTRACT)
    with BuildSketch(Plane(origin=(-30.95686042, 0, 53.070505576), x_dir=(-1, 0, 0), z_dir=(0, 0, 1))) as chamfer6_piece_7:
        Polygon((0.5 + CHAMFER6_SIZE, 0), (0.5, -CHAMFER6_SIZE), (0.5, 0), align=None)
    revolve(axis=Axis((-30.95686042, 0, 53.070505576), (0, -1, 0)), revolution_arc=90, mode=Mode.SUBTRACT)
    with BuildSketch(Plane(origin=(-30.95686042, 0, 48.070505576), x_dir=(-1, 0, 0), z_dir=(0, 0, -1))) as chamfer6_piece_8:
        Polygon((0.5 + CHAMFER6_SIZE, 0), (0.5, CHAMFER6_SIZE), (0.5, 0), align=None)
    revolve(axis=Axis((-30.95686042, 0, 48.070505576), (0, 1, 0)), revolution_arc=90, mode=Mode.SUBTRACT)
    with BuildSketch(Plane(origin=(-30.45686042, 0, 49.070505576), x_dir=(0, 0, -1), z_dir=(-1, 0, 0))) as chamfer6_piece_9:
        Polygon((0.5 - CHAMFER6_SIZE, 0), (0.5, -CHAMFER6_SIZE), (0.5, 0), align=None)
    revolve(axis=Axis((-30.45686042, 0, 49.070505576), (0, -1, 0)), revolution_arc=90, mode=Mode.SUBTRACT)
    with BuildSketch(Plane(origin=(-30.45686042, 0, 52.070505576), x_dir=(0, 0, 1), z_dir=(-1, 0, 0))) as chamfer6_piece_10:
        Polygon((0.5 - CHAMFER6_SIZE, 0), (0.5, CHAMFER6_SIZE), (0.5, 0), align=None)
    revolve(axis=Axis((-30.45686042, 0, 52.070505576), (0, 1, 0)), revolution_arc=90, mode=Mode.SUBTRACT)

    # Sketch22 → Boss-Extrude11 (add)
    with BuildSketch(Plane(origin=(0, 0, 35.570505576), x_dir=(-1, 0, 0), z_dir=(0, 0, -1))):
        with Locations((45.45686042, 2)):
            Rectangle(SKETCH22_W, SKETCH22_H)
    extrude(amount=BOSS_EXTRUDE11_DEPTH)

    # Sketch23 → Boss-Extrude12 (add)
    with BuildSketch(Plane.XY.offset(66.370505576)):
        with Locations((-49.45686042, 2)):
            Rectangle(SKETCH23_W, SKETCH23_H)
    extrude(amount=BOSS_EXTRUDE12_DEPTH)


solid = part.part
